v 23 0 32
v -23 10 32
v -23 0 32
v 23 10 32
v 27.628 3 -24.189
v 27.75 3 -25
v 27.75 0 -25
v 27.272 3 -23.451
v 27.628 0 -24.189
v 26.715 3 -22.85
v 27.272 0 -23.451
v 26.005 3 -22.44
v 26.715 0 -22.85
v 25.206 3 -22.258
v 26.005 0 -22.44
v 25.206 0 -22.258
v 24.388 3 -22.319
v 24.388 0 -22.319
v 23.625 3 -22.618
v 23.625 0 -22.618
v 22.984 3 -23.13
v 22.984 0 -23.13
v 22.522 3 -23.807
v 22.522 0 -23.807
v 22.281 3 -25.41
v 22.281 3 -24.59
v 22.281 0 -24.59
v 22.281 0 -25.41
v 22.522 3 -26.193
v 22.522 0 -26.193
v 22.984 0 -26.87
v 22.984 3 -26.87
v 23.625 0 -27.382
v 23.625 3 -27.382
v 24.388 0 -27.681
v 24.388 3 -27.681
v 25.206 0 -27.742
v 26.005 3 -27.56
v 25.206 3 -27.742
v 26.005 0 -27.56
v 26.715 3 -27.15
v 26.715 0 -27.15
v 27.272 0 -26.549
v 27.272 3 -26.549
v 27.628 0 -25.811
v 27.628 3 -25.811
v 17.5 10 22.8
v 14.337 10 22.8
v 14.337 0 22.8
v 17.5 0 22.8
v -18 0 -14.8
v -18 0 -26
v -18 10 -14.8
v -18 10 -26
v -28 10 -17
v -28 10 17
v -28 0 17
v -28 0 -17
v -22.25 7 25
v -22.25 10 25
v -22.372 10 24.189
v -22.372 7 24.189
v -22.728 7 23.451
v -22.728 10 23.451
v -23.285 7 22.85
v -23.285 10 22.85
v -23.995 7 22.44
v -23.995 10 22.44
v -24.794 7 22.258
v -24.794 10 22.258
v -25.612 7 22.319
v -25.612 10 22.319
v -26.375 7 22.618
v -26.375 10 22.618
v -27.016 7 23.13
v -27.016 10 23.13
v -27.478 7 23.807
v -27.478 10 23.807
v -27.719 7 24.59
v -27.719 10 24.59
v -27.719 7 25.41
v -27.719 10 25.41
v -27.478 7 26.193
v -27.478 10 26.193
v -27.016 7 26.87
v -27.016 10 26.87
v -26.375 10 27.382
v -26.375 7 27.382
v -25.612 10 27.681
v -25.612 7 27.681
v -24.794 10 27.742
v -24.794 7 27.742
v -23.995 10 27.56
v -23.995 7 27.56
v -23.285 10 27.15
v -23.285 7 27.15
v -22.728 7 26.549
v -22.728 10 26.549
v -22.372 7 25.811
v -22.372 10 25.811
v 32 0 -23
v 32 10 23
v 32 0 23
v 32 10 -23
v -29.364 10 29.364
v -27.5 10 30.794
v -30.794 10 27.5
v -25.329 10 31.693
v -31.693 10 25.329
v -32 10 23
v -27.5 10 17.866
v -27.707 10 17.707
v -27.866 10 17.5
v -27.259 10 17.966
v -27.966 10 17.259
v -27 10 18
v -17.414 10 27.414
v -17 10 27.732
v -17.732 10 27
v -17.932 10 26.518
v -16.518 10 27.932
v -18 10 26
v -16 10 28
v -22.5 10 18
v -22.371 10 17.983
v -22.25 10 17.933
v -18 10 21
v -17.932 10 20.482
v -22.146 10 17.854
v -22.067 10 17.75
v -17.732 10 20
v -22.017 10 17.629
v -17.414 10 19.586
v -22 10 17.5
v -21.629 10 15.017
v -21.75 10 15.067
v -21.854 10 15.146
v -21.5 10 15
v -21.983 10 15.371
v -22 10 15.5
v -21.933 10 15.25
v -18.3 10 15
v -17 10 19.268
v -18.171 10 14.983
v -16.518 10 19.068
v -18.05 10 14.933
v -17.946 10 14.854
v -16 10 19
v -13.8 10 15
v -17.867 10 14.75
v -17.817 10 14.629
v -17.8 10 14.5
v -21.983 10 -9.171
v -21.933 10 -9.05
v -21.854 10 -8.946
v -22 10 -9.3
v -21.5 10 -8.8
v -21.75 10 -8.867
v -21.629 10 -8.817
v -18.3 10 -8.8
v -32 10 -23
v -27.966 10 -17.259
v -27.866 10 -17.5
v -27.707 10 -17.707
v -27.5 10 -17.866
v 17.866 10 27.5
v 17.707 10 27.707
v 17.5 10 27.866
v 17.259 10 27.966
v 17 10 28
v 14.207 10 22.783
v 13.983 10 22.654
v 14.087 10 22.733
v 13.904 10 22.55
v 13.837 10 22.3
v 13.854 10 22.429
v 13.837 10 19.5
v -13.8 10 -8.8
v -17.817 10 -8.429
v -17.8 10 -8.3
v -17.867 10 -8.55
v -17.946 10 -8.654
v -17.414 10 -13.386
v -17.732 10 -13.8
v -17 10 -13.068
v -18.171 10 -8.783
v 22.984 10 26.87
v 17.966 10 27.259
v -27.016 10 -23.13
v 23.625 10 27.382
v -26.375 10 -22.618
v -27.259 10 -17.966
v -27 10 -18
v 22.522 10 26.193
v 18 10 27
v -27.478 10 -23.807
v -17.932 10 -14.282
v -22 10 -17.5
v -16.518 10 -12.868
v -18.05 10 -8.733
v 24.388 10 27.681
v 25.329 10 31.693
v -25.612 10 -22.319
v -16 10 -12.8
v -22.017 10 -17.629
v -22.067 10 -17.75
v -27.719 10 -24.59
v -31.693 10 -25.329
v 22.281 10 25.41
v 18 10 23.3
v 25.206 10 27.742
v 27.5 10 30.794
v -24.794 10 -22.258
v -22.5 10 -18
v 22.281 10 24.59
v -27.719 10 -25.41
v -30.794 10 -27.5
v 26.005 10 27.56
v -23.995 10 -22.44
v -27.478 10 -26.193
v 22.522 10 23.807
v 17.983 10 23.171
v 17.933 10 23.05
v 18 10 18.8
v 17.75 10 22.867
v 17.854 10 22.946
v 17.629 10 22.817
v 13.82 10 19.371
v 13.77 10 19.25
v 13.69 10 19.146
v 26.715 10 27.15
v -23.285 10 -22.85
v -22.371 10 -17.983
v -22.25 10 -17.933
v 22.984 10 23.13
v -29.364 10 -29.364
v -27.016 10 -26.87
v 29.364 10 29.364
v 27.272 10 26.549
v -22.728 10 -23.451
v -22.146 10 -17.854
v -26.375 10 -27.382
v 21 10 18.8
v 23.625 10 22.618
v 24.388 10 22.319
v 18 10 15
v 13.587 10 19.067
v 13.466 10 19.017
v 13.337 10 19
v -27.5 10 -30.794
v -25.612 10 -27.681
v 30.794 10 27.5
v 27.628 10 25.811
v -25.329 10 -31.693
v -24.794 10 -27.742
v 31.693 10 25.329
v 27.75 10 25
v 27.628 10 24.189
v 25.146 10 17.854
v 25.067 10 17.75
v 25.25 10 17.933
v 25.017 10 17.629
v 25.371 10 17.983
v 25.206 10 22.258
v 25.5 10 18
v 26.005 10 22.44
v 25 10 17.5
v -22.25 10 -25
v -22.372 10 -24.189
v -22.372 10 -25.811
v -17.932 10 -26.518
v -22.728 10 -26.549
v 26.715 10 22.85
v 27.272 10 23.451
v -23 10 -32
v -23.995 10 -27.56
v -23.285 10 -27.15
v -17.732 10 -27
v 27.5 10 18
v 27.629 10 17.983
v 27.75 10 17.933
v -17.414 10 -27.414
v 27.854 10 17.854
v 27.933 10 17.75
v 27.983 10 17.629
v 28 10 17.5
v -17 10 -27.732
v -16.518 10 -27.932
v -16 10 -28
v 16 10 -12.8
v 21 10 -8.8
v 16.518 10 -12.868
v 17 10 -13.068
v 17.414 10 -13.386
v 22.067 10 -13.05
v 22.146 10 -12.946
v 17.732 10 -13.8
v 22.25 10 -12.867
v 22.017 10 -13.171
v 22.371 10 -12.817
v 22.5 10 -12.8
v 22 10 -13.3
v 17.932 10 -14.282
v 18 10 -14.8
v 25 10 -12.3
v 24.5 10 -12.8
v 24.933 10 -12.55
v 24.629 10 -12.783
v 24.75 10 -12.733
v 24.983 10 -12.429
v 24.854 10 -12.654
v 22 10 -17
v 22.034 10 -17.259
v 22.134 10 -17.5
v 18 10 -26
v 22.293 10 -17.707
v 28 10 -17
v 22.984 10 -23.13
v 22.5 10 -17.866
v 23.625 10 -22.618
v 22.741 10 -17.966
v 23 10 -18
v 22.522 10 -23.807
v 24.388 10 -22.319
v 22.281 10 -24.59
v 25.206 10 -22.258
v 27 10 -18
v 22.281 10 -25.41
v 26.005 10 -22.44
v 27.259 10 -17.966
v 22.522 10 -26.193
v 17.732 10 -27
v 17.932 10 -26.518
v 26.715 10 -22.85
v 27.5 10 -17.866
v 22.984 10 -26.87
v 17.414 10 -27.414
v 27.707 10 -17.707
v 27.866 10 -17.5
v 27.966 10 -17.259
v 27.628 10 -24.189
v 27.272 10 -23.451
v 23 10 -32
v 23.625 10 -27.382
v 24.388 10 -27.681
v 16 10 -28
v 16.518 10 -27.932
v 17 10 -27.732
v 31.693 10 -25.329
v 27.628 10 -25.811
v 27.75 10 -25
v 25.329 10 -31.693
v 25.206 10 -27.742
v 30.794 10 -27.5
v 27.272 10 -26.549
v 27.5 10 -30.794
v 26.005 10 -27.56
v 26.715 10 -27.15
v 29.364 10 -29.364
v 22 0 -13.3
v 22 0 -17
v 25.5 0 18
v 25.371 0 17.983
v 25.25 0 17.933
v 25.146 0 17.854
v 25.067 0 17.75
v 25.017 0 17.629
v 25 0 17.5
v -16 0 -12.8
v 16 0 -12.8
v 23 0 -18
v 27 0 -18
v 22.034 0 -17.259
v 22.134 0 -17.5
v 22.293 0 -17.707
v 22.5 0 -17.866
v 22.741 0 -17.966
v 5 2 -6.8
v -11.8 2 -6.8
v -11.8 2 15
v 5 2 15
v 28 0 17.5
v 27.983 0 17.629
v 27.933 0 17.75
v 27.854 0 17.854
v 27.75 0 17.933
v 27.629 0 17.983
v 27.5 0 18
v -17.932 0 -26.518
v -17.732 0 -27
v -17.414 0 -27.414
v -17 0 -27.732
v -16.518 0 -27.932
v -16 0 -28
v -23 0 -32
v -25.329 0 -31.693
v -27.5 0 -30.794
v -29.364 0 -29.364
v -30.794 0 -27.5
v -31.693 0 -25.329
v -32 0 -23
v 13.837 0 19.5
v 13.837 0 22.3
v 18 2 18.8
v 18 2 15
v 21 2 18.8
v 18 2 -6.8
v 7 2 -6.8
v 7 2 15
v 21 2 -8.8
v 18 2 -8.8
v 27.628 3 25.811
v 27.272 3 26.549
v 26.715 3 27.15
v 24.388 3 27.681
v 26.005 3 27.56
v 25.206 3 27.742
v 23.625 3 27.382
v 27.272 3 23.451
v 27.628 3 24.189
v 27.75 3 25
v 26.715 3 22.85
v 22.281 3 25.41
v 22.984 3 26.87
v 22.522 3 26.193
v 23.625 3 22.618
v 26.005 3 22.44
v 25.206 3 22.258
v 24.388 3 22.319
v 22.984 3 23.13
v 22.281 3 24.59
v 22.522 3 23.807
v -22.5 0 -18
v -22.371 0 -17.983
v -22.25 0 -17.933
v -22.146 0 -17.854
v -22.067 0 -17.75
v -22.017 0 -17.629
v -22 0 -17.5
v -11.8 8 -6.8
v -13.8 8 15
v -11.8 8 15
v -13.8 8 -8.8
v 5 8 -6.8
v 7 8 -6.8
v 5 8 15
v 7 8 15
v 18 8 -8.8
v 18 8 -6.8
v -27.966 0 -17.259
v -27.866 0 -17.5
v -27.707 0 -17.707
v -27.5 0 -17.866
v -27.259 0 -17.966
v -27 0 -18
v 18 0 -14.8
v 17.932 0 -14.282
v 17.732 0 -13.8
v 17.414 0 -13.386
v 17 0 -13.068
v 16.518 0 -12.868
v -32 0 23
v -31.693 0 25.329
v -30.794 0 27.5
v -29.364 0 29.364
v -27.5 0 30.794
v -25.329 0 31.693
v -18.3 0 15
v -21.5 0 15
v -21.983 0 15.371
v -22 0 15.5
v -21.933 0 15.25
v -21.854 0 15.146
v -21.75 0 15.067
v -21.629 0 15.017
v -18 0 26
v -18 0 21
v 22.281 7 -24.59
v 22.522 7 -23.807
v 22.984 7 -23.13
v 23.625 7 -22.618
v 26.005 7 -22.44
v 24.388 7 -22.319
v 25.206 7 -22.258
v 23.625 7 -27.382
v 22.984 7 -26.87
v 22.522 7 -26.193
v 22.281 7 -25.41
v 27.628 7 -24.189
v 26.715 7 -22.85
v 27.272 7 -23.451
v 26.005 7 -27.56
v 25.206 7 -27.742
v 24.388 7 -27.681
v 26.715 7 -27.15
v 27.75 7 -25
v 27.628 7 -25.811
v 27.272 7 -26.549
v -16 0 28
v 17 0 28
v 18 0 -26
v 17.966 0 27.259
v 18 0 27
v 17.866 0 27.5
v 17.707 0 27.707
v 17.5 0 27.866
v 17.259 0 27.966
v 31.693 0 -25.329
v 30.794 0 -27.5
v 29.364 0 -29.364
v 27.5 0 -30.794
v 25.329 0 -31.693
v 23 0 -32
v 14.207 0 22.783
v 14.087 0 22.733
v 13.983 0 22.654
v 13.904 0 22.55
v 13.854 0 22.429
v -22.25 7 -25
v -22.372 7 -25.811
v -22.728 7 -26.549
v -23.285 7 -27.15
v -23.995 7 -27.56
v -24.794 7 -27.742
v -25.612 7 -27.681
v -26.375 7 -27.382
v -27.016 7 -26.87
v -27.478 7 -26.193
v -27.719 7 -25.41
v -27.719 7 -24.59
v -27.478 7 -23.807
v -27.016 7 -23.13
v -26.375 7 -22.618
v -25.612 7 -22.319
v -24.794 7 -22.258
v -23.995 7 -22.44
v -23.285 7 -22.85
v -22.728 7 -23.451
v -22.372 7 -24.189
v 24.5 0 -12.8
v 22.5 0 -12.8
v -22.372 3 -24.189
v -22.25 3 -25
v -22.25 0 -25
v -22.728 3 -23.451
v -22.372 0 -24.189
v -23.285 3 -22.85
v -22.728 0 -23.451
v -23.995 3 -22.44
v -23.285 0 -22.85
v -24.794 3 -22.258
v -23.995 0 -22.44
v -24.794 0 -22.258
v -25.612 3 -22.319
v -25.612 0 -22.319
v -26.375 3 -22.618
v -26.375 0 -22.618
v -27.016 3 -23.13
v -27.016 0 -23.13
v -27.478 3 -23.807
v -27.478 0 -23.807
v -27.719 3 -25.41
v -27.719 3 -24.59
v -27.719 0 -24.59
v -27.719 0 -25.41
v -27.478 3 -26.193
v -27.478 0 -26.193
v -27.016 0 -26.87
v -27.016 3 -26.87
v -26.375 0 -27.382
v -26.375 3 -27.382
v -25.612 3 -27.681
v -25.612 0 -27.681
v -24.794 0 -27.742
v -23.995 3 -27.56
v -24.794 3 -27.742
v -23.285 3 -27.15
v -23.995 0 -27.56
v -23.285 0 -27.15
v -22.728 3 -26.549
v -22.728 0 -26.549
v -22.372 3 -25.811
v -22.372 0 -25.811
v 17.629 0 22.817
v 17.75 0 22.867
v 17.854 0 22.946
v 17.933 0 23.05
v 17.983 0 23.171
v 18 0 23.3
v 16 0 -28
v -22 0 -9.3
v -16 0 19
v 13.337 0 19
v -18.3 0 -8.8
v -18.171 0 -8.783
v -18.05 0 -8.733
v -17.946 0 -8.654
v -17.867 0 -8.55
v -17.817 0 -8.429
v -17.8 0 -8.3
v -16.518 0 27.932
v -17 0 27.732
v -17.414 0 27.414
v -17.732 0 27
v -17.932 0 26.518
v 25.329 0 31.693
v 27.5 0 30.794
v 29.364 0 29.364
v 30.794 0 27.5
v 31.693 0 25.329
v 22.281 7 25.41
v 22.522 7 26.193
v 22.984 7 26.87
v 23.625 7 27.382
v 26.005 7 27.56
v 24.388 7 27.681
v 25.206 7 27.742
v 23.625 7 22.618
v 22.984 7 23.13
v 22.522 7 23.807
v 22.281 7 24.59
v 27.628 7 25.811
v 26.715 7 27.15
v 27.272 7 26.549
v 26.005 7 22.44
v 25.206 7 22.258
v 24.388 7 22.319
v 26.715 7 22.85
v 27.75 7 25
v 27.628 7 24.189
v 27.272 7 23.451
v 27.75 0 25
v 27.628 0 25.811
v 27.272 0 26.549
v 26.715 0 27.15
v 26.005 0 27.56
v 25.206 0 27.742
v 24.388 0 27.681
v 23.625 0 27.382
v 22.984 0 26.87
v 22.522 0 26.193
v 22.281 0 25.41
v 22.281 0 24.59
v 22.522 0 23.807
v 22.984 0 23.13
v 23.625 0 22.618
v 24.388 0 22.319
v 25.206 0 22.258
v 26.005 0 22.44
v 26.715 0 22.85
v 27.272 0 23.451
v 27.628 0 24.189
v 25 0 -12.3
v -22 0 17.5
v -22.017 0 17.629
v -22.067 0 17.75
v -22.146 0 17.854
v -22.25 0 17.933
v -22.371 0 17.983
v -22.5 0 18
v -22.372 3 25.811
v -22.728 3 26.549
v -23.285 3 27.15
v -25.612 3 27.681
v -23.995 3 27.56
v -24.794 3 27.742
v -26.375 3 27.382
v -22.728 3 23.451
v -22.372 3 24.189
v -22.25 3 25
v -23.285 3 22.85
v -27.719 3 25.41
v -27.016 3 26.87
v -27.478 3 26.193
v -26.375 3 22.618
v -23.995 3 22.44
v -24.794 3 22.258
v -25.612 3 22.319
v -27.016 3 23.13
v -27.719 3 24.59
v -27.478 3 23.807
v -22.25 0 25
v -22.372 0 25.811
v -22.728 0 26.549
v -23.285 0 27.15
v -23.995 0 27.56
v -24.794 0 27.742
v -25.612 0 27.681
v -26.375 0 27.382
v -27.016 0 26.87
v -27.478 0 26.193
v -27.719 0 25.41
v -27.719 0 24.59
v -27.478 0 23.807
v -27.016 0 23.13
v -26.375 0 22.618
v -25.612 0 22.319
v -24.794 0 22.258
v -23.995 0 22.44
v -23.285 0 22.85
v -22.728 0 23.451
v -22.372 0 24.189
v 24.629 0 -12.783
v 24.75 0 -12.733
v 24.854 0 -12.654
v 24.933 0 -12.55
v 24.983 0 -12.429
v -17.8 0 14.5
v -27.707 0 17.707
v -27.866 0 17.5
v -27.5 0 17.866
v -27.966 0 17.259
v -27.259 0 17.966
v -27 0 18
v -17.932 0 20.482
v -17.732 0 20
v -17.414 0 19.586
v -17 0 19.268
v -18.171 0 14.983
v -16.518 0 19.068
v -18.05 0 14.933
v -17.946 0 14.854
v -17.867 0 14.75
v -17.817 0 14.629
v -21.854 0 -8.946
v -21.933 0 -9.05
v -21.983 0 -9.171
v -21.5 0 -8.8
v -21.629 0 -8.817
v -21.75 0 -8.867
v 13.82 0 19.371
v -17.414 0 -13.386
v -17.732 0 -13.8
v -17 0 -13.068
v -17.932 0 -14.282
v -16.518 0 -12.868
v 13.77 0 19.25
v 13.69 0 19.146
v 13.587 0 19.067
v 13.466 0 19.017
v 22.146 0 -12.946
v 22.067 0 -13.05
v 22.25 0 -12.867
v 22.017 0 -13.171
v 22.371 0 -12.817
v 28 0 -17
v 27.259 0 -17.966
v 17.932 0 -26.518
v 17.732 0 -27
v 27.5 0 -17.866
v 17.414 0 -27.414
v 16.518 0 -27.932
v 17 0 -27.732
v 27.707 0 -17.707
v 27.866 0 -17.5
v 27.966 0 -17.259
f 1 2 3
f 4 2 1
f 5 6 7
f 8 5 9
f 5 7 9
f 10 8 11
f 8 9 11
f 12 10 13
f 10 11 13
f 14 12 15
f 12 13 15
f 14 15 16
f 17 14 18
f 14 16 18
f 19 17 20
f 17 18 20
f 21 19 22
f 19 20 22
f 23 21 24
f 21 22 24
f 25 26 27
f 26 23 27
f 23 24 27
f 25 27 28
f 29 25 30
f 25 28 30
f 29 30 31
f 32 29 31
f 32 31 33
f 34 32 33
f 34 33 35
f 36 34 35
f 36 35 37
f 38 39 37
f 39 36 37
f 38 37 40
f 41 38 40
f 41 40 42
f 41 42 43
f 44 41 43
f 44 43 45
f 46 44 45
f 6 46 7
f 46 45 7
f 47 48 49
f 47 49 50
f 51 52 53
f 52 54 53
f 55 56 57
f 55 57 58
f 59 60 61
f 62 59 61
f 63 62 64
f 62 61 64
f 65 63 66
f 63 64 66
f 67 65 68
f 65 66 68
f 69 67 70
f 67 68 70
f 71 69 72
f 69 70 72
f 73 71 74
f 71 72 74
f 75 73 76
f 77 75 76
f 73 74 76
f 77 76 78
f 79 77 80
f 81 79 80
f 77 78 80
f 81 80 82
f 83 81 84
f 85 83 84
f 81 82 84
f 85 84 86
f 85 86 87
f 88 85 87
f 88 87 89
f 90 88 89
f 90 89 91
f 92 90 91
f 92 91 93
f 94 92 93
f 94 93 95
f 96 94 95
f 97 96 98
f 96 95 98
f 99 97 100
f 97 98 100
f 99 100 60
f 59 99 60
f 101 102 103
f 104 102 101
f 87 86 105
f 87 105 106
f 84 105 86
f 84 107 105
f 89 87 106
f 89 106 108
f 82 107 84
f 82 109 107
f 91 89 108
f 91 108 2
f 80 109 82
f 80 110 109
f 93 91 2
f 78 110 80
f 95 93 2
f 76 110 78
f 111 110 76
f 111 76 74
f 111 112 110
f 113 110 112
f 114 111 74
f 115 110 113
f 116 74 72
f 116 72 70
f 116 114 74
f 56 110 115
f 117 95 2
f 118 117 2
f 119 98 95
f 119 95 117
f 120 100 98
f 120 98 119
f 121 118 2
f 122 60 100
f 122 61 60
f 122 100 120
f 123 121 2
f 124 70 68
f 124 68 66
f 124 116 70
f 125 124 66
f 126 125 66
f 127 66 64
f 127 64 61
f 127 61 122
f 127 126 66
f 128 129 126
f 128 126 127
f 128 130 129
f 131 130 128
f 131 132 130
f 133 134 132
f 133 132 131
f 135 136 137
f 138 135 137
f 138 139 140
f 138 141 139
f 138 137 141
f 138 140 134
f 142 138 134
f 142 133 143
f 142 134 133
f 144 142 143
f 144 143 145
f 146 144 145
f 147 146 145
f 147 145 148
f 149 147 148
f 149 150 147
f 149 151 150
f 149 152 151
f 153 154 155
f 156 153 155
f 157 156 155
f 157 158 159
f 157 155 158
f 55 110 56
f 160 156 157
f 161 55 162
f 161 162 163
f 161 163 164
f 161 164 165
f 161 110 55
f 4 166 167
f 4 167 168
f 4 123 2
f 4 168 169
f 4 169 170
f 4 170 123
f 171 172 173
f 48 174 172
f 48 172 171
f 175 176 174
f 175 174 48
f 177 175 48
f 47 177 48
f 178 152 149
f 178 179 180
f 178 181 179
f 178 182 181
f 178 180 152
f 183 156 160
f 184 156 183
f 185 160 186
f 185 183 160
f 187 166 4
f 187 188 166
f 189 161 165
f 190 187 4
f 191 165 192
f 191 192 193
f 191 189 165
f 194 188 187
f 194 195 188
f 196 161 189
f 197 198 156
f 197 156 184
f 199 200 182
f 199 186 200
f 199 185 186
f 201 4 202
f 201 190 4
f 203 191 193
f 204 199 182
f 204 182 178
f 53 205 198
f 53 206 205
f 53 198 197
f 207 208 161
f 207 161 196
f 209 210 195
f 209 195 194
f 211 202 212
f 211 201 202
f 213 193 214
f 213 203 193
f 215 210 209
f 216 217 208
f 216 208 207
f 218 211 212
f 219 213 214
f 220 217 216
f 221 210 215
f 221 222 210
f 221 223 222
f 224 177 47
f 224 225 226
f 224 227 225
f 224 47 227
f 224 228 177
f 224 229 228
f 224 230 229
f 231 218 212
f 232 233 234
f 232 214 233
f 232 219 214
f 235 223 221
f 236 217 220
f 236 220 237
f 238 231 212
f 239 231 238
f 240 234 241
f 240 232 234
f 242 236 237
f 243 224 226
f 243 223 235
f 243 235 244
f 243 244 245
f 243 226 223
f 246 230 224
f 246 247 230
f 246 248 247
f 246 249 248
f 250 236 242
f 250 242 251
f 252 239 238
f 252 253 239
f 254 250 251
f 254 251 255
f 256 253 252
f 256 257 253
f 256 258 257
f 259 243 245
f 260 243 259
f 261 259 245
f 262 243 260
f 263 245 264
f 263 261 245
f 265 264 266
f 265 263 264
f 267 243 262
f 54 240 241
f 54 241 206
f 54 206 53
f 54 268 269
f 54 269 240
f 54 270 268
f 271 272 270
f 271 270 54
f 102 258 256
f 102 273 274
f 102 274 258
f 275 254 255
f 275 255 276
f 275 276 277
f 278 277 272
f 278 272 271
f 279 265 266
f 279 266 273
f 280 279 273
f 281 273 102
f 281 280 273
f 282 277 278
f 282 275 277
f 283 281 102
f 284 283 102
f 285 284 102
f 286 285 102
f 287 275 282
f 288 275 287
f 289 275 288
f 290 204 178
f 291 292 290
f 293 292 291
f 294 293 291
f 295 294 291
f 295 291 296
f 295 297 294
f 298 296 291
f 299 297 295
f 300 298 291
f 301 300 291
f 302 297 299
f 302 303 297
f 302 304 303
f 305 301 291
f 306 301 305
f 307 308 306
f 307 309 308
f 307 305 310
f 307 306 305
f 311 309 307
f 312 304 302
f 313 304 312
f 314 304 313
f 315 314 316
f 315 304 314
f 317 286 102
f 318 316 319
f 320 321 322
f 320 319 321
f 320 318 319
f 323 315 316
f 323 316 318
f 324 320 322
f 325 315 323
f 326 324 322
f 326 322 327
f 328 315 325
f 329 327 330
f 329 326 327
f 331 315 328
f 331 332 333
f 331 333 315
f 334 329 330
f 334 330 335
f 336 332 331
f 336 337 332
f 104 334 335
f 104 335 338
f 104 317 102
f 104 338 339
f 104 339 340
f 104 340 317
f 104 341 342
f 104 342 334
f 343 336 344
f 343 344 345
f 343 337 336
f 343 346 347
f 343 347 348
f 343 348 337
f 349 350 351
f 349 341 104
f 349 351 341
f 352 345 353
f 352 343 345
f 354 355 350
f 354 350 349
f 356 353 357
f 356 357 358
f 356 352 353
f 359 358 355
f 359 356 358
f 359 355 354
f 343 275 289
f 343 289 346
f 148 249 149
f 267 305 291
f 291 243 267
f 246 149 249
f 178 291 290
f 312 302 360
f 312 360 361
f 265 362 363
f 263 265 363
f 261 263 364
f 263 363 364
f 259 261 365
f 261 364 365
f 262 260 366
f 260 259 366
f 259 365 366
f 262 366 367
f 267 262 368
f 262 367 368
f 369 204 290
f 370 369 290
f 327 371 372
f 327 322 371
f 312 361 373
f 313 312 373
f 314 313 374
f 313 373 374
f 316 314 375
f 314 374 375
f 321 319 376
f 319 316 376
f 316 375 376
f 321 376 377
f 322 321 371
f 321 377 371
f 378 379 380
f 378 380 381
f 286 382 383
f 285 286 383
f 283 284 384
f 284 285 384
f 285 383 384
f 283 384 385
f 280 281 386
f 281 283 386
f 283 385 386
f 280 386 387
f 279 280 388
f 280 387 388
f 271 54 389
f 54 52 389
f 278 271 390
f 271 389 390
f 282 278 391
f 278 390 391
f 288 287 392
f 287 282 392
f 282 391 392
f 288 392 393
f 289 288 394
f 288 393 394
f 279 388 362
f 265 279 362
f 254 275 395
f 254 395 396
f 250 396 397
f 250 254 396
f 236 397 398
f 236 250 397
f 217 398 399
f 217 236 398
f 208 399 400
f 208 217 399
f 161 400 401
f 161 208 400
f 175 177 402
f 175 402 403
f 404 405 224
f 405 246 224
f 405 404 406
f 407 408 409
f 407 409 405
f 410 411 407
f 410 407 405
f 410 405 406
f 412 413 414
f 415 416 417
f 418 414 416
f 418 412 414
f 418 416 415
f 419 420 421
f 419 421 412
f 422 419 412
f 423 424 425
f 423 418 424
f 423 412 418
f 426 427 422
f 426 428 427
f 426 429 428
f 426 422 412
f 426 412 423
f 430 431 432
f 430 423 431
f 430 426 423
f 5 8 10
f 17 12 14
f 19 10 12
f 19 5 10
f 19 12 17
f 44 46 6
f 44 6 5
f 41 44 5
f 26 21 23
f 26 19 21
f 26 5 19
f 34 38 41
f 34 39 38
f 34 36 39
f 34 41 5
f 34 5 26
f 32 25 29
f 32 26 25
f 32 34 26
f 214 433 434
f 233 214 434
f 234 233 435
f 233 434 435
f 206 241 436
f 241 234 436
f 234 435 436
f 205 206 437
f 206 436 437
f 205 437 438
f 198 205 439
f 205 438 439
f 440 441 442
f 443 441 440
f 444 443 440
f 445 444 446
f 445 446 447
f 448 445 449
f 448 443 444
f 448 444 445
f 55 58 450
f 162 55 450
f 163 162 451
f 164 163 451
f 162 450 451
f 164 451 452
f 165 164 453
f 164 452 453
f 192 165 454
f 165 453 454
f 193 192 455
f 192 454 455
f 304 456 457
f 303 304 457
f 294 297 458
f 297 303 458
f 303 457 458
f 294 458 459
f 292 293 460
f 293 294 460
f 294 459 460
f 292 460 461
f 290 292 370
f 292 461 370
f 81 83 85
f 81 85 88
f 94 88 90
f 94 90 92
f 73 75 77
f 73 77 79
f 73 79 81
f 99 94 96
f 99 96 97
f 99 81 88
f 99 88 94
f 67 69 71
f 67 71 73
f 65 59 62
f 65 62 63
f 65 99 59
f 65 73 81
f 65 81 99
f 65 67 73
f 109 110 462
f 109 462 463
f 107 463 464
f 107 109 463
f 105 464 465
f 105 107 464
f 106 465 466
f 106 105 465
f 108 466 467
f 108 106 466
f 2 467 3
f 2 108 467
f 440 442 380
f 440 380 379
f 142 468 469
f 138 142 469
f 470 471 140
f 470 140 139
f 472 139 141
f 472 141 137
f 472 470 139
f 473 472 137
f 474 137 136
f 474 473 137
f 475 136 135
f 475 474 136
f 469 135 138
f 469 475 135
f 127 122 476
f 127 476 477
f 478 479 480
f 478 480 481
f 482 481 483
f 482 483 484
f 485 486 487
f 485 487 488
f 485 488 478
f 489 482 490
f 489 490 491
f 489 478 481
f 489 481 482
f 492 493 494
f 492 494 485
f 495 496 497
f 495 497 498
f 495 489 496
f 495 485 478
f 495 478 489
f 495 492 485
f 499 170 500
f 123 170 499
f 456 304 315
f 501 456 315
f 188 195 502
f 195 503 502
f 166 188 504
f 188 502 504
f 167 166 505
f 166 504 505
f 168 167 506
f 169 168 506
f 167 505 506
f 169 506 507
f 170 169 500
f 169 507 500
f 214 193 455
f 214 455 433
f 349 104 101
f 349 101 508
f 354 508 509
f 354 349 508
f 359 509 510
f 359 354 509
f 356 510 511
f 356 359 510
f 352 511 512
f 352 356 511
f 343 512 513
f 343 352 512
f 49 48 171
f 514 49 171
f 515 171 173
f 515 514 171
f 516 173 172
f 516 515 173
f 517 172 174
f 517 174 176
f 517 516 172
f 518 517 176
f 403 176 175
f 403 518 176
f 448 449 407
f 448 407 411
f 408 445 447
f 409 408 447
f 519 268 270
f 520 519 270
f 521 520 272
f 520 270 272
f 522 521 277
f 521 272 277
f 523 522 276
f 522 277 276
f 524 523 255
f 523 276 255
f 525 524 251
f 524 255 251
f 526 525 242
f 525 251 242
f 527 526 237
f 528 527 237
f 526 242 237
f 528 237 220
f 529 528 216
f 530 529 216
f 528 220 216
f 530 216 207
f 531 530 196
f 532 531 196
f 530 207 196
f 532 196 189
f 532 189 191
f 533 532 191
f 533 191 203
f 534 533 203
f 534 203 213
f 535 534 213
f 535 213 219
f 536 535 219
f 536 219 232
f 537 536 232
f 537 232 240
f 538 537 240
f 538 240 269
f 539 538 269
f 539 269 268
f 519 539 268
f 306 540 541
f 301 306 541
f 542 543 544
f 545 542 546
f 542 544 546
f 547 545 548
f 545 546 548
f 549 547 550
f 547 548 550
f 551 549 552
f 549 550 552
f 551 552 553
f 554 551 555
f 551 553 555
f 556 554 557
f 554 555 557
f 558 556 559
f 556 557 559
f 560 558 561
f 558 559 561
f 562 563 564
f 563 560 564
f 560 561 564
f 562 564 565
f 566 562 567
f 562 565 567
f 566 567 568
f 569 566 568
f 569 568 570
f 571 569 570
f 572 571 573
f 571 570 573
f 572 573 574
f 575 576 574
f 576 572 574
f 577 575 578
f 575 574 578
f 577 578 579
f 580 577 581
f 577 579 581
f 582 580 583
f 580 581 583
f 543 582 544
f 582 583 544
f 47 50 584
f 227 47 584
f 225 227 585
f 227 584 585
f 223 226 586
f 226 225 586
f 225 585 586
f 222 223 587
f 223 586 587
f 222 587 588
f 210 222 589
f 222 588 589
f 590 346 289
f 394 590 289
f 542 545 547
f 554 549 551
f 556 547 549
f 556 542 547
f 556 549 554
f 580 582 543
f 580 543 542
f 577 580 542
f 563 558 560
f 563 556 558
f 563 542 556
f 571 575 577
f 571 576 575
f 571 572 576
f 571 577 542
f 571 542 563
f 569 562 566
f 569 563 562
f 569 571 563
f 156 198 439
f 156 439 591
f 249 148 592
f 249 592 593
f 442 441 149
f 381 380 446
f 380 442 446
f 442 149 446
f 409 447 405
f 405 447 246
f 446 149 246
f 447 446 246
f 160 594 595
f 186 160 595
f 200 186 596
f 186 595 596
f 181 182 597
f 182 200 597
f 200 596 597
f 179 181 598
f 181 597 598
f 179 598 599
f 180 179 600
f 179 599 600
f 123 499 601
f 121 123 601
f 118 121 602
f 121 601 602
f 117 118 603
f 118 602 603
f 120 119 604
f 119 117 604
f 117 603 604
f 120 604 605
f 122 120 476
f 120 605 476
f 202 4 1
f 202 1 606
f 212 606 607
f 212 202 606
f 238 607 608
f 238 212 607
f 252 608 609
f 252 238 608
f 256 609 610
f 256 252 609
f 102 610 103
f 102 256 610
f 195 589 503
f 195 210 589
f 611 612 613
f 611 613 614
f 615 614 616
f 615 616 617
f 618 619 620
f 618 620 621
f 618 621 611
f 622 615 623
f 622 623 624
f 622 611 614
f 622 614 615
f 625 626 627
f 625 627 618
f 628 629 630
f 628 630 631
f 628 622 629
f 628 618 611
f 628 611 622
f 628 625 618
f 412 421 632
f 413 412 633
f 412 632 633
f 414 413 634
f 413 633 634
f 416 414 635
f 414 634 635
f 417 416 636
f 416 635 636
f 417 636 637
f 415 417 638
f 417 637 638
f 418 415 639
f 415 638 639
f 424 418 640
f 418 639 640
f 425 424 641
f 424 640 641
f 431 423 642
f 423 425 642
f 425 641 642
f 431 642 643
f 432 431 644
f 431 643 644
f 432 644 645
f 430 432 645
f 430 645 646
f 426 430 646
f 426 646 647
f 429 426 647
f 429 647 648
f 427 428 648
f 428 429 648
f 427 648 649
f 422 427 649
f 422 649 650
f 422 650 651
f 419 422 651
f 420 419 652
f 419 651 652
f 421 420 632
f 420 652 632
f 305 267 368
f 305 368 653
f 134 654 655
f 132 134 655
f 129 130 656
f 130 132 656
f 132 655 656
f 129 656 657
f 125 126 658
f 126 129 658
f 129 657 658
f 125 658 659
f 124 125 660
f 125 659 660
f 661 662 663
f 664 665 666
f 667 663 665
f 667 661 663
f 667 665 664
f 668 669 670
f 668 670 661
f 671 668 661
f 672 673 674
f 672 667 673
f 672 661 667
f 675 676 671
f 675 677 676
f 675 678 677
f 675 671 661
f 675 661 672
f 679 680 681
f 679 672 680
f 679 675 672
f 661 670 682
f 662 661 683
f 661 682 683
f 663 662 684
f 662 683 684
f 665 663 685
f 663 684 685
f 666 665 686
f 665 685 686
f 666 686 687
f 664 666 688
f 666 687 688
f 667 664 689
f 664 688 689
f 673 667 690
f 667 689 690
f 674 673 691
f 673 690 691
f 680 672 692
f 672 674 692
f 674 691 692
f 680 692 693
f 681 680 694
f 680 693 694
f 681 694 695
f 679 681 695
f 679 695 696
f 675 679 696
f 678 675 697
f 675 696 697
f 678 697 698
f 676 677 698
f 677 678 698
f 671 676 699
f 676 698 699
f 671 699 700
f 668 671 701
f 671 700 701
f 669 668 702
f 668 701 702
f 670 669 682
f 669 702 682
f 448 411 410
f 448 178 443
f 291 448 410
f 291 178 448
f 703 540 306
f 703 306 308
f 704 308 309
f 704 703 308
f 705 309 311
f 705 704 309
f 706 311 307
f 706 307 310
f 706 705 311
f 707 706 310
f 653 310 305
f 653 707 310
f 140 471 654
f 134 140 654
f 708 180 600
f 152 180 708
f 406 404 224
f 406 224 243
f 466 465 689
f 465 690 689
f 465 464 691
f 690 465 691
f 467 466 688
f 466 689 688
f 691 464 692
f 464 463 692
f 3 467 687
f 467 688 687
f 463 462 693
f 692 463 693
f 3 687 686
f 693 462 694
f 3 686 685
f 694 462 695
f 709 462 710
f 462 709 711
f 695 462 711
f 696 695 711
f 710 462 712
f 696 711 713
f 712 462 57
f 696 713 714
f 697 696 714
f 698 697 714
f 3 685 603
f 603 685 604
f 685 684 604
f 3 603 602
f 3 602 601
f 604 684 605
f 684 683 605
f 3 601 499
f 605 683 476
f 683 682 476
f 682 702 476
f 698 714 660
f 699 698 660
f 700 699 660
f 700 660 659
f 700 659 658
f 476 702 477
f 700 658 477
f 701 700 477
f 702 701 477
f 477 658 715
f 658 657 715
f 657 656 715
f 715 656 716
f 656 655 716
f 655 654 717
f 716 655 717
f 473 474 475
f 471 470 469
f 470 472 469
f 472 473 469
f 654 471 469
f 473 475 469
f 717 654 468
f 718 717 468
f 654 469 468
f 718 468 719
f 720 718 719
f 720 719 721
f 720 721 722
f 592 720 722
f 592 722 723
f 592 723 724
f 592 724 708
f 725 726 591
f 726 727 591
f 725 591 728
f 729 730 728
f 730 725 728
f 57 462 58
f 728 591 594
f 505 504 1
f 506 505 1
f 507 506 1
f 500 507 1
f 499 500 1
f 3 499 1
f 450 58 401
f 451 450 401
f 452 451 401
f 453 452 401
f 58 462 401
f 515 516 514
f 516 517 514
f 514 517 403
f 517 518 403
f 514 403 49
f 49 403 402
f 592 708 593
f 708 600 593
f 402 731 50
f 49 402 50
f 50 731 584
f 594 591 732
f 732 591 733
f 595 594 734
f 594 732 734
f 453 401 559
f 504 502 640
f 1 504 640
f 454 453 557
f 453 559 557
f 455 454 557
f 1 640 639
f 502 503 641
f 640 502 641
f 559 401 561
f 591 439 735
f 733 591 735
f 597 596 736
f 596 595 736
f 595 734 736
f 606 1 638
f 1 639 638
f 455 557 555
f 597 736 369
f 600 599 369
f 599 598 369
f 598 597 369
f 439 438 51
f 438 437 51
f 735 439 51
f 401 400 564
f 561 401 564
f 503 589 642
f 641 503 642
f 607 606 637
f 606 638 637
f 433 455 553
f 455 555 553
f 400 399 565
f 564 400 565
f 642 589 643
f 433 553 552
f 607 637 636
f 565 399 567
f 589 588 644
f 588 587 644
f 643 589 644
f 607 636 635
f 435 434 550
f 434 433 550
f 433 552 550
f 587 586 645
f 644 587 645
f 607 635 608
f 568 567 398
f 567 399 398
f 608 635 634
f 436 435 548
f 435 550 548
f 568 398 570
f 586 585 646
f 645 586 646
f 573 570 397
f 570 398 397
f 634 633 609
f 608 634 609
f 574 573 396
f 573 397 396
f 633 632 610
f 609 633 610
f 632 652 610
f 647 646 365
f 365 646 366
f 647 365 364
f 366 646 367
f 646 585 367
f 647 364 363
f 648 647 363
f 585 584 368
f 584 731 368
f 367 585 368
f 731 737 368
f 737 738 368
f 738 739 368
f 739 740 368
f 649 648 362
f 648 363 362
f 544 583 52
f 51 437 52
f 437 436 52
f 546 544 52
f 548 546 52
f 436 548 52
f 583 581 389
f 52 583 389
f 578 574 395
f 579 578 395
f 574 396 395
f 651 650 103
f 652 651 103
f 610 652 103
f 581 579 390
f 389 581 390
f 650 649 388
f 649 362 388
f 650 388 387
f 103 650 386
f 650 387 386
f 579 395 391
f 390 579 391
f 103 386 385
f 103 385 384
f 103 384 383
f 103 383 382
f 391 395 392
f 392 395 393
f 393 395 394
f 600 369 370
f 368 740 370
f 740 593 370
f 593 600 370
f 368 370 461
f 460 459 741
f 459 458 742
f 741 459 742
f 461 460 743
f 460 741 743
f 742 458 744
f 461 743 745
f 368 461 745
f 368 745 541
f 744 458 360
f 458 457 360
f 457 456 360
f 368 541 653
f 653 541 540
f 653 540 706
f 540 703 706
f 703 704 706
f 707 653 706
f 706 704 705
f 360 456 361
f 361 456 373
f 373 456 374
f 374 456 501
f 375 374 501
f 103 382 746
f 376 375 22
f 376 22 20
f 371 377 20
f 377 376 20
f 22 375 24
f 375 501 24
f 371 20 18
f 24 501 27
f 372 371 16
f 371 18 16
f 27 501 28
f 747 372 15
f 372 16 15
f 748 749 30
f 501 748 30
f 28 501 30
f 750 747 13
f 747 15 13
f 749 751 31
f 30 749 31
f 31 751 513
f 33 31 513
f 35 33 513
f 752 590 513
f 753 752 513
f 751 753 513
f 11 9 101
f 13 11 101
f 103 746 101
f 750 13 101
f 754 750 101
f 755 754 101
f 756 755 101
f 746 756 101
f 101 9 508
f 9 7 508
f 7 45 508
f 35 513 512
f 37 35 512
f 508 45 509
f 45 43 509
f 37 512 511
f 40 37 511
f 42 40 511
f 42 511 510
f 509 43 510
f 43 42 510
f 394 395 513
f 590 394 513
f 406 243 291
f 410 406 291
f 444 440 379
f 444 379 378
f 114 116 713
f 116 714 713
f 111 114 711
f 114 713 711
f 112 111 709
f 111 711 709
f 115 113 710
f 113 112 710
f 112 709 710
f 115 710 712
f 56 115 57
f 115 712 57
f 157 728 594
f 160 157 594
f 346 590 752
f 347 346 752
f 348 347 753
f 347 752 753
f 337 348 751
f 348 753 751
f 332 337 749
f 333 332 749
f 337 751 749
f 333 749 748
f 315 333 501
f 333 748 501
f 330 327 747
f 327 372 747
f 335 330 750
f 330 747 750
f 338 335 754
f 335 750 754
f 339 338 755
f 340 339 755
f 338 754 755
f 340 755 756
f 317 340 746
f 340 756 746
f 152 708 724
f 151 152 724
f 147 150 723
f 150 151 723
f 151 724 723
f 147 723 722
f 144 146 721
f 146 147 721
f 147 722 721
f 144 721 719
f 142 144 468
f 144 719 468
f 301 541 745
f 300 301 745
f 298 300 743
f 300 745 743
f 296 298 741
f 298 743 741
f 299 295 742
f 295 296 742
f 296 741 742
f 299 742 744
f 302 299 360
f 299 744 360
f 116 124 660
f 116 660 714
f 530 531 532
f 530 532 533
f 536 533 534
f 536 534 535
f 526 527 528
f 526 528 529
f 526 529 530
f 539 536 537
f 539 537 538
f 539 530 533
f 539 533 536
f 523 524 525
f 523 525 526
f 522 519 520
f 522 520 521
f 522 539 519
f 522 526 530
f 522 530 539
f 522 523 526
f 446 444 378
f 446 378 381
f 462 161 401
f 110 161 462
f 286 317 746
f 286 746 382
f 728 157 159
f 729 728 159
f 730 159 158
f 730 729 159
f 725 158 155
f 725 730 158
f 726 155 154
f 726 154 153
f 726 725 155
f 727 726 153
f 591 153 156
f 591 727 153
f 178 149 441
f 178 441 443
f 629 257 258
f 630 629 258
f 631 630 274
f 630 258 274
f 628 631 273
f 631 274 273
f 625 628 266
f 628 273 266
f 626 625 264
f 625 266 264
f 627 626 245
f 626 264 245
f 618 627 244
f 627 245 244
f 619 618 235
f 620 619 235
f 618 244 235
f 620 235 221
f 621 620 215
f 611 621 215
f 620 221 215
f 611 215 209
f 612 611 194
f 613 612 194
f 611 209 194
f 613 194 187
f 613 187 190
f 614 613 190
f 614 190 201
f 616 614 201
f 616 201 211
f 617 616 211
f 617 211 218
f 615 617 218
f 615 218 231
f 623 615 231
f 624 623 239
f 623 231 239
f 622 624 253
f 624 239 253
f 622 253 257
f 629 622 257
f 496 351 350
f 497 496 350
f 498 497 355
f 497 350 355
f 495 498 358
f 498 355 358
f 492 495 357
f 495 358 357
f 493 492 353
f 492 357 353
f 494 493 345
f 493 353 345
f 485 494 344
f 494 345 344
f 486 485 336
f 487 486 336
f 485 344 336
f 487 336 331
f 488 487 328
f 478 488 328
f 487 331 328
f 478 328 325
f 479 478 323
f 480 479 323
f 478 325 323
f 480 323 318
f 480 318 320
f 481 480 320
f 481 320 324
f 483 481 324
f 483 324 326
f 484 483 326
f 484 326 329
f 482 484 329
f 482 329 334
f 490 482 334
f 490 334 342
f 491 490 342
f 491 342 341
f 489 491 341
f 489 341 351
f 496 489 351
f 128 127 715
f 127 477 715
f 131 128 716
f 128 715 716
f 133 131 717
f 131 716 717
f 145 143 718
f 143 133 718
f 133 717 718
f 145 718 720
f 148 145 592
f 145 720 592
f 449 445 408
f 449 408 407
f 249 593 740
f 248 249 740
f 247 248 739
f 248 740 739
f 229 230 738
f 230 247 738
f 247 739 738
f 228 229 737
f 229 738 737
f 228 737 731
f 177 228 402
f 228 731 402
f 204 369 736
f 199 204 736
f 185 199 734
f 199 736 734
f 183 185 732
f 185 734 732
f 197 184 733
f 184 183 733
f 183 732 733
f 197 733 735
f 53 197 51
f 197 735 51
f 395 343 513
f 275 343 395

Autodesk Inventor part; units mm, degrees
ref_plane "YZ Plane" through (0, 0, 0) normal (1, 0, 0) x (0, 1, 0)
ref_plane "XZ Plane" through (0, 0, 0) normal (0, 1, 0) x (-1, 0, 0)
sketch "Sketch1" plane through (0, 0, 0) normal (0, 1, 0) x (-1, 0, 0)
  line L0 (30, 30) -> (-30, 30)
  line L1 (-30, 30) -> (-30, -30)
  line L2 (-30, -30) -> (30, -30)
  line L3 (30, -30) -> (30, 30)
  line L4 (30, 30) -> (-30, -30) construction
  line L5 (-30, 30) -> (30, -30) construction
  point P0 (0, 0)
  dimension "d0" = 60
  dimension "d1" = 60
extrude "Extrusion1" add sketch "Sketch1" along normal blind 10
fillet "Fillet1" radius 7 4 edges at (30, 5, 30) (30, 5, -30) (-30, 5, 30) (-30, 5, -30)
sketch "Sketch2" plane through (0, 10, 0) normal (0, 1, 0) x (1, 0, 0)
  line L0 (-30, 30) -> (30, 30)
  line L1 (30, 30) -> (30, -30)
  line L2 (30, -30) -> (-30, -30)
  line L3 (-30, -30) -> (-30, 30)
  line L4 (-30, 30) -> (30, -30) construction
  line L5 (30, 30) -> (-30, -30) construction
  line L6 (25, -25) -> (25, 25)
  line L7 (25, 25) -> (-25, 25)
  line L8 (-25, 25) -> (-25, -25)
  line L9 (-25, -25) -> (25, -25)
  circle A0 centre (25, -25) radius 2.75
  circle A1 centre (-25, -25) radius 2.75
  circle A2 centre (25, 25) radius 2.75
  circle A3 centre (-25, 25) radius 2.75
  point P0 (0, 0)
  dimension "d5" = 5
  dimension "d6" = 5.5
  dimension "d7" = 5.5
  dimension "d8" = 5.5
  dimension "d9" = 5.5
extrude "Extrusion2" cut sketch "Sketch2" against normal blind 3 contours L9 A0 L6 | L6 A0 L9 | A2 L7 L6 | L6 L7 A2 | A1 L8 L9 | L9 L8 A1 | A3 L8 L7 | L7 L8 A3
sketch "Sketch7" plane through (0, 10, 0) normal (0, 1, 0) x (1, 0, 0)
  line L0 (-23, 30) -> (23, 30)
  line L1 (30, 23) -> (30, -23)
  line L2 (23, -30) -> (-23, -30)
  line L3 (-30, -23) -> (-30, 23)
  line L4 (-30, 30) -> (30, -30) construction
  line L5 (30, 30) -> (-30, -30) construction
  arc A0 (-23, 30) -> (-30, 23) centre (-23, 23) ccw
  arc A1 (-30, -23) -> (-23, -30) centre (-23, -23) ccw
  arc A2 (23, -30) -> (30, -23) centre (23, -23) ccw
  arc A3 (30, 23) -> (23, 30) centre (23, 23) ccw
  line L6 (23, 32) -> (-23, 32)
  arc A4 (-23, 32) -> (-32, 23) centre (-23, 23) ccw
  line L7 (-32, 23) -> (-32, -23)
  arc A5 (-32, -23) -> (-23, -32) centre (-23, -23) ccw
  line L8 (-23, -32) -> (23, -32)
  arc A6 (23, -32) -> (32, -23) centre (23, -23) ccw
  line L9 (32, -23) -> (32, 23)
  arc A7 (32, 23) -> (23, 32) centre (23, 23) ccw
  point P0 (0, 0)
  dimension "d47" = 7
  dimension "d48" = 2
extrude "Extrusion6" add sketch "Sketch7" against normal blind 10
sketch "Sketch23" plane through (0, 10, 0) normal (0, 1, 0) x (1, 0, 0)
  line L0 (-25, 25) -> (25, 25)
  line L1 (25, 25) -> (25, -25)
  line L2 (25, -25) -> (-25, -25)
  line L3 (-25, -25) -> (-25, 25)
  line L4 (-25, 25) -> (25, -25) construction
  line L5 (25, 25) -> (-25, -25) construction
  line L6 (21, -21) -> (21, 21)
  line L7 (21, 21) -> (-21, 21)
  line L8 (-21, 21) -> (-21, -21)
  line L9 (-21, -21) -> (21, -21)
  line L10 (-13.8, -15) -> (-13.8, 8.8)
  line L11 (-13.8, 8.8) -> (21, 8.8)
  line L12 (-11.8, 6.8) -> (-11.8, -15)
  line L13 (18, 8.8) -> (18, 6.8)
  line L14 (-13.8, -15) -> (18, -15)
  line L15 (7, 3.1073) -> (7, -15)
  line L16 (7, 3.1073) -> (7, 6.8)
  line L17 (5, -15) -> (5, 3.1073)
  line L18 (5, 3.1073) -> (5, 6.8)
  line L19 (5, 6.8) -> (-11.8, 6.8)
  line L20 (18, -15) -> (18, -18.6)
  line L21 (18, -18.6) -> (21, -18.6)
  line L22 (18, 6.8) -> (7, 6.8)
  point P0 (0, 0)
  point P1 (21, -15)
  dimension "d215" = 50
  dimension "d216" = 50
  dimension "d217" = 4
  dimension "d218" = 6
  dimension "d220" = 34.8
  dimension "d221" = 23.8
  dimension "d224" = 3
  dimension "d225" = 14
  dimension "d226" = 2
  dimension "d227" = 3
  dimension "d228" = 3.6
extrude "Extrusion21" cut sketch "Sketch23" against normal blind 2 contours L13 L22 L16 L15 L14 L17 L18 L19 L12 L10 L11
sketch "Sketch24" plane through (0, 10, 0) normal (0, 1, 0) x (1, 0, 0)
  line L0 (-11.8, 6.8) -> (5, 6.8)
  line L1 (5, 6.8) -> (5, -15)
  line L2 (5, -15) -> (-11.8, -15)
  line L3 (-11.8, -15) -> (-11.8, 6.8)
  point P0 (0, 0)
extrude "Extrusion22" cut sketch "Sketch24" against normal blind 8
sketch "Sketch25" plane through (0, 10, 0) normal (0, 1, 0) x (1, 0, 0)
  line L0 (7, 6.8) -> (18, 6.8)
  line L1 (18, 6.8) -> (18, 8.8)
  line L2 (18, 8.8) -> (21, 8.8)
  line L3 (7, 6.8) -> (7, -15)
  line L4 (21, 8.8) -> (21, -15)
  line L5 (7, -15) -> (18, -15)
  line L6 (18, -15) -> (18, -18.8)
  line L7 (18, -18.8) -> (21, -18.8)
  line L8 (21, -18.8) -> (21, -15)
  point P0 (0, 0)
  point P1 (21, -17.8036)
  dimension "d233" = 3
  dimension "d234" = 3
  dimension "d235" = 3.8
extrude "Extrusion23" cut sketch "Sketch25" against normal blind 8
sketch "Sketch26" plane through (0, 10, 0) normal (0, 1, 0) x (1, 0, 0)
  line L0 (23, 32) -> (-23, 32) projected
  line L1 (-32, 23) -> (-32, -23) projected
  line L2 (32, -23) -> (32, 23) projected
  line L3 (-13.8, 8.8) -> (21, 8.8) projected
  line L4 (-18, 28) -> (-18, 12.8)
  line L5 (-18, 12.8) -> (18, 12.8)
  line L6 (18, 12.8) -> (18, 28)
  line L7 (18, 28) -> (-18, 28)
  line L8 (-23, -32) -> (23, -32) projected
  line L9 (21, 8.8) -> (21, -18.8) projected
  line L10 (28, 18) -> (28, -18)
  line L11 (28, -18) -> (25, -18)
  line L12 (25, -18) -> (25, 8.8)
  line L13 (25, 8.8) -> (25, 12.8)
  line L14 (25, 12.8) -> (22, 12.8)
  line L15 (22, 12.8) -> (22, 18)
  line L16 (22, 18) -> (28, 18)
  line L17 (21, -18.8) -> (18, -18.8) projected
  line L18 (18, -15) -> (-13.8, -15) projected
  line L19 (18, -28) -> (-18, -28)
  line L20 (-18, -28) -> (-18, -19)
  line L21 (-18, -19) -> (13.8369, -19)
  line L22 (13.8369, -19) -> (13.8369, -22.8)
  line L23 (13.8369, -22.8) -> (18, -22.8)
  line L24 (18, -22.8) -> (18, -28)
  line L25 (-13.8, -15) -> (-13.8, 8.8) projected
  line L26 (-28, 18) -> (-22, 18)
  line L27 (-22, 18) -> (-22, 8.8)
  line L28 (-22, 8.8) -> (-17.8, 8.8)
  line L29 (-17.8, 8.8) -> (-17.8, -15)
  line L30 (-17.8, -15) -> (-22, -15)
  line L31 (-22, -15) -> (-22, -18)
  line L32 (-22, -18) -> (-28, -18)
  line L33 (-28, -18) -> (-28, 18)
  point P0 (0, 0)
  dimension "d238" = 4
  dimension "d239" = 4
  dimension "d240" = 14
  dimension "d241" = 14
  dimension "d242" = 4
  dimension "d243" = 4
  dimension "d244" = 14
  dimension "d245" = 4
  dimension "d246" = 14
  dimension "d247" = 4
  dimension "d248" = 4
  dimension "d249" = 4
  dimension "d250" = 4
  dimension "d251" = 14
  dimension "d252" = 14
  dimension "d253" = 4
  dimension "d254" = 4
  dimension "d255" = 4
  dimension "d256" = 14
  dimension "d257" = 4
  dimension "d258" = 14
  dimension "d259" = 4
  dimension "d260" = 4
extrude "Extrusion24" cut sketch "Sketch26" against normal through all
fillet "Fillet7" radius 0.5 13 edges at (-22, 5, -18) (-22, 5, -8.8) (-17.8, 5, -8.8) (-22, 5, 15) (-17.8, 5, 15) (-22, 5, 18) (22, 5, -12.8) (25, 5, -12.8) (28, 5, 18) (25, 5, 18) (13.8369, 5, 19) (13.8369, 5, 22.8) (18, 5, 22.8)
fillet "Fillet7" radius 1 5 edges at (22, 5, -18) (28, 5, -18) (-28, 5, -18) (-28, 5, 18) (18, 5, 28)
fillet "Fillet7" radius 2 6 edges at (-18, 5, -28) (18, 5, -28) (18, 5, -12.8) (-18, 5, -12.8) (-18, 5, 19) (-18, 5, 28)
ref_plane "Work Plane6" through (0, 5, 0) normal (0, 1, 0) x (1, 0, 0)
mirror "Mirror6" about plane through (0, 5, 0) normal (0, 1, 0) of "Extrusion2"
properties part number "16 pin holder"
